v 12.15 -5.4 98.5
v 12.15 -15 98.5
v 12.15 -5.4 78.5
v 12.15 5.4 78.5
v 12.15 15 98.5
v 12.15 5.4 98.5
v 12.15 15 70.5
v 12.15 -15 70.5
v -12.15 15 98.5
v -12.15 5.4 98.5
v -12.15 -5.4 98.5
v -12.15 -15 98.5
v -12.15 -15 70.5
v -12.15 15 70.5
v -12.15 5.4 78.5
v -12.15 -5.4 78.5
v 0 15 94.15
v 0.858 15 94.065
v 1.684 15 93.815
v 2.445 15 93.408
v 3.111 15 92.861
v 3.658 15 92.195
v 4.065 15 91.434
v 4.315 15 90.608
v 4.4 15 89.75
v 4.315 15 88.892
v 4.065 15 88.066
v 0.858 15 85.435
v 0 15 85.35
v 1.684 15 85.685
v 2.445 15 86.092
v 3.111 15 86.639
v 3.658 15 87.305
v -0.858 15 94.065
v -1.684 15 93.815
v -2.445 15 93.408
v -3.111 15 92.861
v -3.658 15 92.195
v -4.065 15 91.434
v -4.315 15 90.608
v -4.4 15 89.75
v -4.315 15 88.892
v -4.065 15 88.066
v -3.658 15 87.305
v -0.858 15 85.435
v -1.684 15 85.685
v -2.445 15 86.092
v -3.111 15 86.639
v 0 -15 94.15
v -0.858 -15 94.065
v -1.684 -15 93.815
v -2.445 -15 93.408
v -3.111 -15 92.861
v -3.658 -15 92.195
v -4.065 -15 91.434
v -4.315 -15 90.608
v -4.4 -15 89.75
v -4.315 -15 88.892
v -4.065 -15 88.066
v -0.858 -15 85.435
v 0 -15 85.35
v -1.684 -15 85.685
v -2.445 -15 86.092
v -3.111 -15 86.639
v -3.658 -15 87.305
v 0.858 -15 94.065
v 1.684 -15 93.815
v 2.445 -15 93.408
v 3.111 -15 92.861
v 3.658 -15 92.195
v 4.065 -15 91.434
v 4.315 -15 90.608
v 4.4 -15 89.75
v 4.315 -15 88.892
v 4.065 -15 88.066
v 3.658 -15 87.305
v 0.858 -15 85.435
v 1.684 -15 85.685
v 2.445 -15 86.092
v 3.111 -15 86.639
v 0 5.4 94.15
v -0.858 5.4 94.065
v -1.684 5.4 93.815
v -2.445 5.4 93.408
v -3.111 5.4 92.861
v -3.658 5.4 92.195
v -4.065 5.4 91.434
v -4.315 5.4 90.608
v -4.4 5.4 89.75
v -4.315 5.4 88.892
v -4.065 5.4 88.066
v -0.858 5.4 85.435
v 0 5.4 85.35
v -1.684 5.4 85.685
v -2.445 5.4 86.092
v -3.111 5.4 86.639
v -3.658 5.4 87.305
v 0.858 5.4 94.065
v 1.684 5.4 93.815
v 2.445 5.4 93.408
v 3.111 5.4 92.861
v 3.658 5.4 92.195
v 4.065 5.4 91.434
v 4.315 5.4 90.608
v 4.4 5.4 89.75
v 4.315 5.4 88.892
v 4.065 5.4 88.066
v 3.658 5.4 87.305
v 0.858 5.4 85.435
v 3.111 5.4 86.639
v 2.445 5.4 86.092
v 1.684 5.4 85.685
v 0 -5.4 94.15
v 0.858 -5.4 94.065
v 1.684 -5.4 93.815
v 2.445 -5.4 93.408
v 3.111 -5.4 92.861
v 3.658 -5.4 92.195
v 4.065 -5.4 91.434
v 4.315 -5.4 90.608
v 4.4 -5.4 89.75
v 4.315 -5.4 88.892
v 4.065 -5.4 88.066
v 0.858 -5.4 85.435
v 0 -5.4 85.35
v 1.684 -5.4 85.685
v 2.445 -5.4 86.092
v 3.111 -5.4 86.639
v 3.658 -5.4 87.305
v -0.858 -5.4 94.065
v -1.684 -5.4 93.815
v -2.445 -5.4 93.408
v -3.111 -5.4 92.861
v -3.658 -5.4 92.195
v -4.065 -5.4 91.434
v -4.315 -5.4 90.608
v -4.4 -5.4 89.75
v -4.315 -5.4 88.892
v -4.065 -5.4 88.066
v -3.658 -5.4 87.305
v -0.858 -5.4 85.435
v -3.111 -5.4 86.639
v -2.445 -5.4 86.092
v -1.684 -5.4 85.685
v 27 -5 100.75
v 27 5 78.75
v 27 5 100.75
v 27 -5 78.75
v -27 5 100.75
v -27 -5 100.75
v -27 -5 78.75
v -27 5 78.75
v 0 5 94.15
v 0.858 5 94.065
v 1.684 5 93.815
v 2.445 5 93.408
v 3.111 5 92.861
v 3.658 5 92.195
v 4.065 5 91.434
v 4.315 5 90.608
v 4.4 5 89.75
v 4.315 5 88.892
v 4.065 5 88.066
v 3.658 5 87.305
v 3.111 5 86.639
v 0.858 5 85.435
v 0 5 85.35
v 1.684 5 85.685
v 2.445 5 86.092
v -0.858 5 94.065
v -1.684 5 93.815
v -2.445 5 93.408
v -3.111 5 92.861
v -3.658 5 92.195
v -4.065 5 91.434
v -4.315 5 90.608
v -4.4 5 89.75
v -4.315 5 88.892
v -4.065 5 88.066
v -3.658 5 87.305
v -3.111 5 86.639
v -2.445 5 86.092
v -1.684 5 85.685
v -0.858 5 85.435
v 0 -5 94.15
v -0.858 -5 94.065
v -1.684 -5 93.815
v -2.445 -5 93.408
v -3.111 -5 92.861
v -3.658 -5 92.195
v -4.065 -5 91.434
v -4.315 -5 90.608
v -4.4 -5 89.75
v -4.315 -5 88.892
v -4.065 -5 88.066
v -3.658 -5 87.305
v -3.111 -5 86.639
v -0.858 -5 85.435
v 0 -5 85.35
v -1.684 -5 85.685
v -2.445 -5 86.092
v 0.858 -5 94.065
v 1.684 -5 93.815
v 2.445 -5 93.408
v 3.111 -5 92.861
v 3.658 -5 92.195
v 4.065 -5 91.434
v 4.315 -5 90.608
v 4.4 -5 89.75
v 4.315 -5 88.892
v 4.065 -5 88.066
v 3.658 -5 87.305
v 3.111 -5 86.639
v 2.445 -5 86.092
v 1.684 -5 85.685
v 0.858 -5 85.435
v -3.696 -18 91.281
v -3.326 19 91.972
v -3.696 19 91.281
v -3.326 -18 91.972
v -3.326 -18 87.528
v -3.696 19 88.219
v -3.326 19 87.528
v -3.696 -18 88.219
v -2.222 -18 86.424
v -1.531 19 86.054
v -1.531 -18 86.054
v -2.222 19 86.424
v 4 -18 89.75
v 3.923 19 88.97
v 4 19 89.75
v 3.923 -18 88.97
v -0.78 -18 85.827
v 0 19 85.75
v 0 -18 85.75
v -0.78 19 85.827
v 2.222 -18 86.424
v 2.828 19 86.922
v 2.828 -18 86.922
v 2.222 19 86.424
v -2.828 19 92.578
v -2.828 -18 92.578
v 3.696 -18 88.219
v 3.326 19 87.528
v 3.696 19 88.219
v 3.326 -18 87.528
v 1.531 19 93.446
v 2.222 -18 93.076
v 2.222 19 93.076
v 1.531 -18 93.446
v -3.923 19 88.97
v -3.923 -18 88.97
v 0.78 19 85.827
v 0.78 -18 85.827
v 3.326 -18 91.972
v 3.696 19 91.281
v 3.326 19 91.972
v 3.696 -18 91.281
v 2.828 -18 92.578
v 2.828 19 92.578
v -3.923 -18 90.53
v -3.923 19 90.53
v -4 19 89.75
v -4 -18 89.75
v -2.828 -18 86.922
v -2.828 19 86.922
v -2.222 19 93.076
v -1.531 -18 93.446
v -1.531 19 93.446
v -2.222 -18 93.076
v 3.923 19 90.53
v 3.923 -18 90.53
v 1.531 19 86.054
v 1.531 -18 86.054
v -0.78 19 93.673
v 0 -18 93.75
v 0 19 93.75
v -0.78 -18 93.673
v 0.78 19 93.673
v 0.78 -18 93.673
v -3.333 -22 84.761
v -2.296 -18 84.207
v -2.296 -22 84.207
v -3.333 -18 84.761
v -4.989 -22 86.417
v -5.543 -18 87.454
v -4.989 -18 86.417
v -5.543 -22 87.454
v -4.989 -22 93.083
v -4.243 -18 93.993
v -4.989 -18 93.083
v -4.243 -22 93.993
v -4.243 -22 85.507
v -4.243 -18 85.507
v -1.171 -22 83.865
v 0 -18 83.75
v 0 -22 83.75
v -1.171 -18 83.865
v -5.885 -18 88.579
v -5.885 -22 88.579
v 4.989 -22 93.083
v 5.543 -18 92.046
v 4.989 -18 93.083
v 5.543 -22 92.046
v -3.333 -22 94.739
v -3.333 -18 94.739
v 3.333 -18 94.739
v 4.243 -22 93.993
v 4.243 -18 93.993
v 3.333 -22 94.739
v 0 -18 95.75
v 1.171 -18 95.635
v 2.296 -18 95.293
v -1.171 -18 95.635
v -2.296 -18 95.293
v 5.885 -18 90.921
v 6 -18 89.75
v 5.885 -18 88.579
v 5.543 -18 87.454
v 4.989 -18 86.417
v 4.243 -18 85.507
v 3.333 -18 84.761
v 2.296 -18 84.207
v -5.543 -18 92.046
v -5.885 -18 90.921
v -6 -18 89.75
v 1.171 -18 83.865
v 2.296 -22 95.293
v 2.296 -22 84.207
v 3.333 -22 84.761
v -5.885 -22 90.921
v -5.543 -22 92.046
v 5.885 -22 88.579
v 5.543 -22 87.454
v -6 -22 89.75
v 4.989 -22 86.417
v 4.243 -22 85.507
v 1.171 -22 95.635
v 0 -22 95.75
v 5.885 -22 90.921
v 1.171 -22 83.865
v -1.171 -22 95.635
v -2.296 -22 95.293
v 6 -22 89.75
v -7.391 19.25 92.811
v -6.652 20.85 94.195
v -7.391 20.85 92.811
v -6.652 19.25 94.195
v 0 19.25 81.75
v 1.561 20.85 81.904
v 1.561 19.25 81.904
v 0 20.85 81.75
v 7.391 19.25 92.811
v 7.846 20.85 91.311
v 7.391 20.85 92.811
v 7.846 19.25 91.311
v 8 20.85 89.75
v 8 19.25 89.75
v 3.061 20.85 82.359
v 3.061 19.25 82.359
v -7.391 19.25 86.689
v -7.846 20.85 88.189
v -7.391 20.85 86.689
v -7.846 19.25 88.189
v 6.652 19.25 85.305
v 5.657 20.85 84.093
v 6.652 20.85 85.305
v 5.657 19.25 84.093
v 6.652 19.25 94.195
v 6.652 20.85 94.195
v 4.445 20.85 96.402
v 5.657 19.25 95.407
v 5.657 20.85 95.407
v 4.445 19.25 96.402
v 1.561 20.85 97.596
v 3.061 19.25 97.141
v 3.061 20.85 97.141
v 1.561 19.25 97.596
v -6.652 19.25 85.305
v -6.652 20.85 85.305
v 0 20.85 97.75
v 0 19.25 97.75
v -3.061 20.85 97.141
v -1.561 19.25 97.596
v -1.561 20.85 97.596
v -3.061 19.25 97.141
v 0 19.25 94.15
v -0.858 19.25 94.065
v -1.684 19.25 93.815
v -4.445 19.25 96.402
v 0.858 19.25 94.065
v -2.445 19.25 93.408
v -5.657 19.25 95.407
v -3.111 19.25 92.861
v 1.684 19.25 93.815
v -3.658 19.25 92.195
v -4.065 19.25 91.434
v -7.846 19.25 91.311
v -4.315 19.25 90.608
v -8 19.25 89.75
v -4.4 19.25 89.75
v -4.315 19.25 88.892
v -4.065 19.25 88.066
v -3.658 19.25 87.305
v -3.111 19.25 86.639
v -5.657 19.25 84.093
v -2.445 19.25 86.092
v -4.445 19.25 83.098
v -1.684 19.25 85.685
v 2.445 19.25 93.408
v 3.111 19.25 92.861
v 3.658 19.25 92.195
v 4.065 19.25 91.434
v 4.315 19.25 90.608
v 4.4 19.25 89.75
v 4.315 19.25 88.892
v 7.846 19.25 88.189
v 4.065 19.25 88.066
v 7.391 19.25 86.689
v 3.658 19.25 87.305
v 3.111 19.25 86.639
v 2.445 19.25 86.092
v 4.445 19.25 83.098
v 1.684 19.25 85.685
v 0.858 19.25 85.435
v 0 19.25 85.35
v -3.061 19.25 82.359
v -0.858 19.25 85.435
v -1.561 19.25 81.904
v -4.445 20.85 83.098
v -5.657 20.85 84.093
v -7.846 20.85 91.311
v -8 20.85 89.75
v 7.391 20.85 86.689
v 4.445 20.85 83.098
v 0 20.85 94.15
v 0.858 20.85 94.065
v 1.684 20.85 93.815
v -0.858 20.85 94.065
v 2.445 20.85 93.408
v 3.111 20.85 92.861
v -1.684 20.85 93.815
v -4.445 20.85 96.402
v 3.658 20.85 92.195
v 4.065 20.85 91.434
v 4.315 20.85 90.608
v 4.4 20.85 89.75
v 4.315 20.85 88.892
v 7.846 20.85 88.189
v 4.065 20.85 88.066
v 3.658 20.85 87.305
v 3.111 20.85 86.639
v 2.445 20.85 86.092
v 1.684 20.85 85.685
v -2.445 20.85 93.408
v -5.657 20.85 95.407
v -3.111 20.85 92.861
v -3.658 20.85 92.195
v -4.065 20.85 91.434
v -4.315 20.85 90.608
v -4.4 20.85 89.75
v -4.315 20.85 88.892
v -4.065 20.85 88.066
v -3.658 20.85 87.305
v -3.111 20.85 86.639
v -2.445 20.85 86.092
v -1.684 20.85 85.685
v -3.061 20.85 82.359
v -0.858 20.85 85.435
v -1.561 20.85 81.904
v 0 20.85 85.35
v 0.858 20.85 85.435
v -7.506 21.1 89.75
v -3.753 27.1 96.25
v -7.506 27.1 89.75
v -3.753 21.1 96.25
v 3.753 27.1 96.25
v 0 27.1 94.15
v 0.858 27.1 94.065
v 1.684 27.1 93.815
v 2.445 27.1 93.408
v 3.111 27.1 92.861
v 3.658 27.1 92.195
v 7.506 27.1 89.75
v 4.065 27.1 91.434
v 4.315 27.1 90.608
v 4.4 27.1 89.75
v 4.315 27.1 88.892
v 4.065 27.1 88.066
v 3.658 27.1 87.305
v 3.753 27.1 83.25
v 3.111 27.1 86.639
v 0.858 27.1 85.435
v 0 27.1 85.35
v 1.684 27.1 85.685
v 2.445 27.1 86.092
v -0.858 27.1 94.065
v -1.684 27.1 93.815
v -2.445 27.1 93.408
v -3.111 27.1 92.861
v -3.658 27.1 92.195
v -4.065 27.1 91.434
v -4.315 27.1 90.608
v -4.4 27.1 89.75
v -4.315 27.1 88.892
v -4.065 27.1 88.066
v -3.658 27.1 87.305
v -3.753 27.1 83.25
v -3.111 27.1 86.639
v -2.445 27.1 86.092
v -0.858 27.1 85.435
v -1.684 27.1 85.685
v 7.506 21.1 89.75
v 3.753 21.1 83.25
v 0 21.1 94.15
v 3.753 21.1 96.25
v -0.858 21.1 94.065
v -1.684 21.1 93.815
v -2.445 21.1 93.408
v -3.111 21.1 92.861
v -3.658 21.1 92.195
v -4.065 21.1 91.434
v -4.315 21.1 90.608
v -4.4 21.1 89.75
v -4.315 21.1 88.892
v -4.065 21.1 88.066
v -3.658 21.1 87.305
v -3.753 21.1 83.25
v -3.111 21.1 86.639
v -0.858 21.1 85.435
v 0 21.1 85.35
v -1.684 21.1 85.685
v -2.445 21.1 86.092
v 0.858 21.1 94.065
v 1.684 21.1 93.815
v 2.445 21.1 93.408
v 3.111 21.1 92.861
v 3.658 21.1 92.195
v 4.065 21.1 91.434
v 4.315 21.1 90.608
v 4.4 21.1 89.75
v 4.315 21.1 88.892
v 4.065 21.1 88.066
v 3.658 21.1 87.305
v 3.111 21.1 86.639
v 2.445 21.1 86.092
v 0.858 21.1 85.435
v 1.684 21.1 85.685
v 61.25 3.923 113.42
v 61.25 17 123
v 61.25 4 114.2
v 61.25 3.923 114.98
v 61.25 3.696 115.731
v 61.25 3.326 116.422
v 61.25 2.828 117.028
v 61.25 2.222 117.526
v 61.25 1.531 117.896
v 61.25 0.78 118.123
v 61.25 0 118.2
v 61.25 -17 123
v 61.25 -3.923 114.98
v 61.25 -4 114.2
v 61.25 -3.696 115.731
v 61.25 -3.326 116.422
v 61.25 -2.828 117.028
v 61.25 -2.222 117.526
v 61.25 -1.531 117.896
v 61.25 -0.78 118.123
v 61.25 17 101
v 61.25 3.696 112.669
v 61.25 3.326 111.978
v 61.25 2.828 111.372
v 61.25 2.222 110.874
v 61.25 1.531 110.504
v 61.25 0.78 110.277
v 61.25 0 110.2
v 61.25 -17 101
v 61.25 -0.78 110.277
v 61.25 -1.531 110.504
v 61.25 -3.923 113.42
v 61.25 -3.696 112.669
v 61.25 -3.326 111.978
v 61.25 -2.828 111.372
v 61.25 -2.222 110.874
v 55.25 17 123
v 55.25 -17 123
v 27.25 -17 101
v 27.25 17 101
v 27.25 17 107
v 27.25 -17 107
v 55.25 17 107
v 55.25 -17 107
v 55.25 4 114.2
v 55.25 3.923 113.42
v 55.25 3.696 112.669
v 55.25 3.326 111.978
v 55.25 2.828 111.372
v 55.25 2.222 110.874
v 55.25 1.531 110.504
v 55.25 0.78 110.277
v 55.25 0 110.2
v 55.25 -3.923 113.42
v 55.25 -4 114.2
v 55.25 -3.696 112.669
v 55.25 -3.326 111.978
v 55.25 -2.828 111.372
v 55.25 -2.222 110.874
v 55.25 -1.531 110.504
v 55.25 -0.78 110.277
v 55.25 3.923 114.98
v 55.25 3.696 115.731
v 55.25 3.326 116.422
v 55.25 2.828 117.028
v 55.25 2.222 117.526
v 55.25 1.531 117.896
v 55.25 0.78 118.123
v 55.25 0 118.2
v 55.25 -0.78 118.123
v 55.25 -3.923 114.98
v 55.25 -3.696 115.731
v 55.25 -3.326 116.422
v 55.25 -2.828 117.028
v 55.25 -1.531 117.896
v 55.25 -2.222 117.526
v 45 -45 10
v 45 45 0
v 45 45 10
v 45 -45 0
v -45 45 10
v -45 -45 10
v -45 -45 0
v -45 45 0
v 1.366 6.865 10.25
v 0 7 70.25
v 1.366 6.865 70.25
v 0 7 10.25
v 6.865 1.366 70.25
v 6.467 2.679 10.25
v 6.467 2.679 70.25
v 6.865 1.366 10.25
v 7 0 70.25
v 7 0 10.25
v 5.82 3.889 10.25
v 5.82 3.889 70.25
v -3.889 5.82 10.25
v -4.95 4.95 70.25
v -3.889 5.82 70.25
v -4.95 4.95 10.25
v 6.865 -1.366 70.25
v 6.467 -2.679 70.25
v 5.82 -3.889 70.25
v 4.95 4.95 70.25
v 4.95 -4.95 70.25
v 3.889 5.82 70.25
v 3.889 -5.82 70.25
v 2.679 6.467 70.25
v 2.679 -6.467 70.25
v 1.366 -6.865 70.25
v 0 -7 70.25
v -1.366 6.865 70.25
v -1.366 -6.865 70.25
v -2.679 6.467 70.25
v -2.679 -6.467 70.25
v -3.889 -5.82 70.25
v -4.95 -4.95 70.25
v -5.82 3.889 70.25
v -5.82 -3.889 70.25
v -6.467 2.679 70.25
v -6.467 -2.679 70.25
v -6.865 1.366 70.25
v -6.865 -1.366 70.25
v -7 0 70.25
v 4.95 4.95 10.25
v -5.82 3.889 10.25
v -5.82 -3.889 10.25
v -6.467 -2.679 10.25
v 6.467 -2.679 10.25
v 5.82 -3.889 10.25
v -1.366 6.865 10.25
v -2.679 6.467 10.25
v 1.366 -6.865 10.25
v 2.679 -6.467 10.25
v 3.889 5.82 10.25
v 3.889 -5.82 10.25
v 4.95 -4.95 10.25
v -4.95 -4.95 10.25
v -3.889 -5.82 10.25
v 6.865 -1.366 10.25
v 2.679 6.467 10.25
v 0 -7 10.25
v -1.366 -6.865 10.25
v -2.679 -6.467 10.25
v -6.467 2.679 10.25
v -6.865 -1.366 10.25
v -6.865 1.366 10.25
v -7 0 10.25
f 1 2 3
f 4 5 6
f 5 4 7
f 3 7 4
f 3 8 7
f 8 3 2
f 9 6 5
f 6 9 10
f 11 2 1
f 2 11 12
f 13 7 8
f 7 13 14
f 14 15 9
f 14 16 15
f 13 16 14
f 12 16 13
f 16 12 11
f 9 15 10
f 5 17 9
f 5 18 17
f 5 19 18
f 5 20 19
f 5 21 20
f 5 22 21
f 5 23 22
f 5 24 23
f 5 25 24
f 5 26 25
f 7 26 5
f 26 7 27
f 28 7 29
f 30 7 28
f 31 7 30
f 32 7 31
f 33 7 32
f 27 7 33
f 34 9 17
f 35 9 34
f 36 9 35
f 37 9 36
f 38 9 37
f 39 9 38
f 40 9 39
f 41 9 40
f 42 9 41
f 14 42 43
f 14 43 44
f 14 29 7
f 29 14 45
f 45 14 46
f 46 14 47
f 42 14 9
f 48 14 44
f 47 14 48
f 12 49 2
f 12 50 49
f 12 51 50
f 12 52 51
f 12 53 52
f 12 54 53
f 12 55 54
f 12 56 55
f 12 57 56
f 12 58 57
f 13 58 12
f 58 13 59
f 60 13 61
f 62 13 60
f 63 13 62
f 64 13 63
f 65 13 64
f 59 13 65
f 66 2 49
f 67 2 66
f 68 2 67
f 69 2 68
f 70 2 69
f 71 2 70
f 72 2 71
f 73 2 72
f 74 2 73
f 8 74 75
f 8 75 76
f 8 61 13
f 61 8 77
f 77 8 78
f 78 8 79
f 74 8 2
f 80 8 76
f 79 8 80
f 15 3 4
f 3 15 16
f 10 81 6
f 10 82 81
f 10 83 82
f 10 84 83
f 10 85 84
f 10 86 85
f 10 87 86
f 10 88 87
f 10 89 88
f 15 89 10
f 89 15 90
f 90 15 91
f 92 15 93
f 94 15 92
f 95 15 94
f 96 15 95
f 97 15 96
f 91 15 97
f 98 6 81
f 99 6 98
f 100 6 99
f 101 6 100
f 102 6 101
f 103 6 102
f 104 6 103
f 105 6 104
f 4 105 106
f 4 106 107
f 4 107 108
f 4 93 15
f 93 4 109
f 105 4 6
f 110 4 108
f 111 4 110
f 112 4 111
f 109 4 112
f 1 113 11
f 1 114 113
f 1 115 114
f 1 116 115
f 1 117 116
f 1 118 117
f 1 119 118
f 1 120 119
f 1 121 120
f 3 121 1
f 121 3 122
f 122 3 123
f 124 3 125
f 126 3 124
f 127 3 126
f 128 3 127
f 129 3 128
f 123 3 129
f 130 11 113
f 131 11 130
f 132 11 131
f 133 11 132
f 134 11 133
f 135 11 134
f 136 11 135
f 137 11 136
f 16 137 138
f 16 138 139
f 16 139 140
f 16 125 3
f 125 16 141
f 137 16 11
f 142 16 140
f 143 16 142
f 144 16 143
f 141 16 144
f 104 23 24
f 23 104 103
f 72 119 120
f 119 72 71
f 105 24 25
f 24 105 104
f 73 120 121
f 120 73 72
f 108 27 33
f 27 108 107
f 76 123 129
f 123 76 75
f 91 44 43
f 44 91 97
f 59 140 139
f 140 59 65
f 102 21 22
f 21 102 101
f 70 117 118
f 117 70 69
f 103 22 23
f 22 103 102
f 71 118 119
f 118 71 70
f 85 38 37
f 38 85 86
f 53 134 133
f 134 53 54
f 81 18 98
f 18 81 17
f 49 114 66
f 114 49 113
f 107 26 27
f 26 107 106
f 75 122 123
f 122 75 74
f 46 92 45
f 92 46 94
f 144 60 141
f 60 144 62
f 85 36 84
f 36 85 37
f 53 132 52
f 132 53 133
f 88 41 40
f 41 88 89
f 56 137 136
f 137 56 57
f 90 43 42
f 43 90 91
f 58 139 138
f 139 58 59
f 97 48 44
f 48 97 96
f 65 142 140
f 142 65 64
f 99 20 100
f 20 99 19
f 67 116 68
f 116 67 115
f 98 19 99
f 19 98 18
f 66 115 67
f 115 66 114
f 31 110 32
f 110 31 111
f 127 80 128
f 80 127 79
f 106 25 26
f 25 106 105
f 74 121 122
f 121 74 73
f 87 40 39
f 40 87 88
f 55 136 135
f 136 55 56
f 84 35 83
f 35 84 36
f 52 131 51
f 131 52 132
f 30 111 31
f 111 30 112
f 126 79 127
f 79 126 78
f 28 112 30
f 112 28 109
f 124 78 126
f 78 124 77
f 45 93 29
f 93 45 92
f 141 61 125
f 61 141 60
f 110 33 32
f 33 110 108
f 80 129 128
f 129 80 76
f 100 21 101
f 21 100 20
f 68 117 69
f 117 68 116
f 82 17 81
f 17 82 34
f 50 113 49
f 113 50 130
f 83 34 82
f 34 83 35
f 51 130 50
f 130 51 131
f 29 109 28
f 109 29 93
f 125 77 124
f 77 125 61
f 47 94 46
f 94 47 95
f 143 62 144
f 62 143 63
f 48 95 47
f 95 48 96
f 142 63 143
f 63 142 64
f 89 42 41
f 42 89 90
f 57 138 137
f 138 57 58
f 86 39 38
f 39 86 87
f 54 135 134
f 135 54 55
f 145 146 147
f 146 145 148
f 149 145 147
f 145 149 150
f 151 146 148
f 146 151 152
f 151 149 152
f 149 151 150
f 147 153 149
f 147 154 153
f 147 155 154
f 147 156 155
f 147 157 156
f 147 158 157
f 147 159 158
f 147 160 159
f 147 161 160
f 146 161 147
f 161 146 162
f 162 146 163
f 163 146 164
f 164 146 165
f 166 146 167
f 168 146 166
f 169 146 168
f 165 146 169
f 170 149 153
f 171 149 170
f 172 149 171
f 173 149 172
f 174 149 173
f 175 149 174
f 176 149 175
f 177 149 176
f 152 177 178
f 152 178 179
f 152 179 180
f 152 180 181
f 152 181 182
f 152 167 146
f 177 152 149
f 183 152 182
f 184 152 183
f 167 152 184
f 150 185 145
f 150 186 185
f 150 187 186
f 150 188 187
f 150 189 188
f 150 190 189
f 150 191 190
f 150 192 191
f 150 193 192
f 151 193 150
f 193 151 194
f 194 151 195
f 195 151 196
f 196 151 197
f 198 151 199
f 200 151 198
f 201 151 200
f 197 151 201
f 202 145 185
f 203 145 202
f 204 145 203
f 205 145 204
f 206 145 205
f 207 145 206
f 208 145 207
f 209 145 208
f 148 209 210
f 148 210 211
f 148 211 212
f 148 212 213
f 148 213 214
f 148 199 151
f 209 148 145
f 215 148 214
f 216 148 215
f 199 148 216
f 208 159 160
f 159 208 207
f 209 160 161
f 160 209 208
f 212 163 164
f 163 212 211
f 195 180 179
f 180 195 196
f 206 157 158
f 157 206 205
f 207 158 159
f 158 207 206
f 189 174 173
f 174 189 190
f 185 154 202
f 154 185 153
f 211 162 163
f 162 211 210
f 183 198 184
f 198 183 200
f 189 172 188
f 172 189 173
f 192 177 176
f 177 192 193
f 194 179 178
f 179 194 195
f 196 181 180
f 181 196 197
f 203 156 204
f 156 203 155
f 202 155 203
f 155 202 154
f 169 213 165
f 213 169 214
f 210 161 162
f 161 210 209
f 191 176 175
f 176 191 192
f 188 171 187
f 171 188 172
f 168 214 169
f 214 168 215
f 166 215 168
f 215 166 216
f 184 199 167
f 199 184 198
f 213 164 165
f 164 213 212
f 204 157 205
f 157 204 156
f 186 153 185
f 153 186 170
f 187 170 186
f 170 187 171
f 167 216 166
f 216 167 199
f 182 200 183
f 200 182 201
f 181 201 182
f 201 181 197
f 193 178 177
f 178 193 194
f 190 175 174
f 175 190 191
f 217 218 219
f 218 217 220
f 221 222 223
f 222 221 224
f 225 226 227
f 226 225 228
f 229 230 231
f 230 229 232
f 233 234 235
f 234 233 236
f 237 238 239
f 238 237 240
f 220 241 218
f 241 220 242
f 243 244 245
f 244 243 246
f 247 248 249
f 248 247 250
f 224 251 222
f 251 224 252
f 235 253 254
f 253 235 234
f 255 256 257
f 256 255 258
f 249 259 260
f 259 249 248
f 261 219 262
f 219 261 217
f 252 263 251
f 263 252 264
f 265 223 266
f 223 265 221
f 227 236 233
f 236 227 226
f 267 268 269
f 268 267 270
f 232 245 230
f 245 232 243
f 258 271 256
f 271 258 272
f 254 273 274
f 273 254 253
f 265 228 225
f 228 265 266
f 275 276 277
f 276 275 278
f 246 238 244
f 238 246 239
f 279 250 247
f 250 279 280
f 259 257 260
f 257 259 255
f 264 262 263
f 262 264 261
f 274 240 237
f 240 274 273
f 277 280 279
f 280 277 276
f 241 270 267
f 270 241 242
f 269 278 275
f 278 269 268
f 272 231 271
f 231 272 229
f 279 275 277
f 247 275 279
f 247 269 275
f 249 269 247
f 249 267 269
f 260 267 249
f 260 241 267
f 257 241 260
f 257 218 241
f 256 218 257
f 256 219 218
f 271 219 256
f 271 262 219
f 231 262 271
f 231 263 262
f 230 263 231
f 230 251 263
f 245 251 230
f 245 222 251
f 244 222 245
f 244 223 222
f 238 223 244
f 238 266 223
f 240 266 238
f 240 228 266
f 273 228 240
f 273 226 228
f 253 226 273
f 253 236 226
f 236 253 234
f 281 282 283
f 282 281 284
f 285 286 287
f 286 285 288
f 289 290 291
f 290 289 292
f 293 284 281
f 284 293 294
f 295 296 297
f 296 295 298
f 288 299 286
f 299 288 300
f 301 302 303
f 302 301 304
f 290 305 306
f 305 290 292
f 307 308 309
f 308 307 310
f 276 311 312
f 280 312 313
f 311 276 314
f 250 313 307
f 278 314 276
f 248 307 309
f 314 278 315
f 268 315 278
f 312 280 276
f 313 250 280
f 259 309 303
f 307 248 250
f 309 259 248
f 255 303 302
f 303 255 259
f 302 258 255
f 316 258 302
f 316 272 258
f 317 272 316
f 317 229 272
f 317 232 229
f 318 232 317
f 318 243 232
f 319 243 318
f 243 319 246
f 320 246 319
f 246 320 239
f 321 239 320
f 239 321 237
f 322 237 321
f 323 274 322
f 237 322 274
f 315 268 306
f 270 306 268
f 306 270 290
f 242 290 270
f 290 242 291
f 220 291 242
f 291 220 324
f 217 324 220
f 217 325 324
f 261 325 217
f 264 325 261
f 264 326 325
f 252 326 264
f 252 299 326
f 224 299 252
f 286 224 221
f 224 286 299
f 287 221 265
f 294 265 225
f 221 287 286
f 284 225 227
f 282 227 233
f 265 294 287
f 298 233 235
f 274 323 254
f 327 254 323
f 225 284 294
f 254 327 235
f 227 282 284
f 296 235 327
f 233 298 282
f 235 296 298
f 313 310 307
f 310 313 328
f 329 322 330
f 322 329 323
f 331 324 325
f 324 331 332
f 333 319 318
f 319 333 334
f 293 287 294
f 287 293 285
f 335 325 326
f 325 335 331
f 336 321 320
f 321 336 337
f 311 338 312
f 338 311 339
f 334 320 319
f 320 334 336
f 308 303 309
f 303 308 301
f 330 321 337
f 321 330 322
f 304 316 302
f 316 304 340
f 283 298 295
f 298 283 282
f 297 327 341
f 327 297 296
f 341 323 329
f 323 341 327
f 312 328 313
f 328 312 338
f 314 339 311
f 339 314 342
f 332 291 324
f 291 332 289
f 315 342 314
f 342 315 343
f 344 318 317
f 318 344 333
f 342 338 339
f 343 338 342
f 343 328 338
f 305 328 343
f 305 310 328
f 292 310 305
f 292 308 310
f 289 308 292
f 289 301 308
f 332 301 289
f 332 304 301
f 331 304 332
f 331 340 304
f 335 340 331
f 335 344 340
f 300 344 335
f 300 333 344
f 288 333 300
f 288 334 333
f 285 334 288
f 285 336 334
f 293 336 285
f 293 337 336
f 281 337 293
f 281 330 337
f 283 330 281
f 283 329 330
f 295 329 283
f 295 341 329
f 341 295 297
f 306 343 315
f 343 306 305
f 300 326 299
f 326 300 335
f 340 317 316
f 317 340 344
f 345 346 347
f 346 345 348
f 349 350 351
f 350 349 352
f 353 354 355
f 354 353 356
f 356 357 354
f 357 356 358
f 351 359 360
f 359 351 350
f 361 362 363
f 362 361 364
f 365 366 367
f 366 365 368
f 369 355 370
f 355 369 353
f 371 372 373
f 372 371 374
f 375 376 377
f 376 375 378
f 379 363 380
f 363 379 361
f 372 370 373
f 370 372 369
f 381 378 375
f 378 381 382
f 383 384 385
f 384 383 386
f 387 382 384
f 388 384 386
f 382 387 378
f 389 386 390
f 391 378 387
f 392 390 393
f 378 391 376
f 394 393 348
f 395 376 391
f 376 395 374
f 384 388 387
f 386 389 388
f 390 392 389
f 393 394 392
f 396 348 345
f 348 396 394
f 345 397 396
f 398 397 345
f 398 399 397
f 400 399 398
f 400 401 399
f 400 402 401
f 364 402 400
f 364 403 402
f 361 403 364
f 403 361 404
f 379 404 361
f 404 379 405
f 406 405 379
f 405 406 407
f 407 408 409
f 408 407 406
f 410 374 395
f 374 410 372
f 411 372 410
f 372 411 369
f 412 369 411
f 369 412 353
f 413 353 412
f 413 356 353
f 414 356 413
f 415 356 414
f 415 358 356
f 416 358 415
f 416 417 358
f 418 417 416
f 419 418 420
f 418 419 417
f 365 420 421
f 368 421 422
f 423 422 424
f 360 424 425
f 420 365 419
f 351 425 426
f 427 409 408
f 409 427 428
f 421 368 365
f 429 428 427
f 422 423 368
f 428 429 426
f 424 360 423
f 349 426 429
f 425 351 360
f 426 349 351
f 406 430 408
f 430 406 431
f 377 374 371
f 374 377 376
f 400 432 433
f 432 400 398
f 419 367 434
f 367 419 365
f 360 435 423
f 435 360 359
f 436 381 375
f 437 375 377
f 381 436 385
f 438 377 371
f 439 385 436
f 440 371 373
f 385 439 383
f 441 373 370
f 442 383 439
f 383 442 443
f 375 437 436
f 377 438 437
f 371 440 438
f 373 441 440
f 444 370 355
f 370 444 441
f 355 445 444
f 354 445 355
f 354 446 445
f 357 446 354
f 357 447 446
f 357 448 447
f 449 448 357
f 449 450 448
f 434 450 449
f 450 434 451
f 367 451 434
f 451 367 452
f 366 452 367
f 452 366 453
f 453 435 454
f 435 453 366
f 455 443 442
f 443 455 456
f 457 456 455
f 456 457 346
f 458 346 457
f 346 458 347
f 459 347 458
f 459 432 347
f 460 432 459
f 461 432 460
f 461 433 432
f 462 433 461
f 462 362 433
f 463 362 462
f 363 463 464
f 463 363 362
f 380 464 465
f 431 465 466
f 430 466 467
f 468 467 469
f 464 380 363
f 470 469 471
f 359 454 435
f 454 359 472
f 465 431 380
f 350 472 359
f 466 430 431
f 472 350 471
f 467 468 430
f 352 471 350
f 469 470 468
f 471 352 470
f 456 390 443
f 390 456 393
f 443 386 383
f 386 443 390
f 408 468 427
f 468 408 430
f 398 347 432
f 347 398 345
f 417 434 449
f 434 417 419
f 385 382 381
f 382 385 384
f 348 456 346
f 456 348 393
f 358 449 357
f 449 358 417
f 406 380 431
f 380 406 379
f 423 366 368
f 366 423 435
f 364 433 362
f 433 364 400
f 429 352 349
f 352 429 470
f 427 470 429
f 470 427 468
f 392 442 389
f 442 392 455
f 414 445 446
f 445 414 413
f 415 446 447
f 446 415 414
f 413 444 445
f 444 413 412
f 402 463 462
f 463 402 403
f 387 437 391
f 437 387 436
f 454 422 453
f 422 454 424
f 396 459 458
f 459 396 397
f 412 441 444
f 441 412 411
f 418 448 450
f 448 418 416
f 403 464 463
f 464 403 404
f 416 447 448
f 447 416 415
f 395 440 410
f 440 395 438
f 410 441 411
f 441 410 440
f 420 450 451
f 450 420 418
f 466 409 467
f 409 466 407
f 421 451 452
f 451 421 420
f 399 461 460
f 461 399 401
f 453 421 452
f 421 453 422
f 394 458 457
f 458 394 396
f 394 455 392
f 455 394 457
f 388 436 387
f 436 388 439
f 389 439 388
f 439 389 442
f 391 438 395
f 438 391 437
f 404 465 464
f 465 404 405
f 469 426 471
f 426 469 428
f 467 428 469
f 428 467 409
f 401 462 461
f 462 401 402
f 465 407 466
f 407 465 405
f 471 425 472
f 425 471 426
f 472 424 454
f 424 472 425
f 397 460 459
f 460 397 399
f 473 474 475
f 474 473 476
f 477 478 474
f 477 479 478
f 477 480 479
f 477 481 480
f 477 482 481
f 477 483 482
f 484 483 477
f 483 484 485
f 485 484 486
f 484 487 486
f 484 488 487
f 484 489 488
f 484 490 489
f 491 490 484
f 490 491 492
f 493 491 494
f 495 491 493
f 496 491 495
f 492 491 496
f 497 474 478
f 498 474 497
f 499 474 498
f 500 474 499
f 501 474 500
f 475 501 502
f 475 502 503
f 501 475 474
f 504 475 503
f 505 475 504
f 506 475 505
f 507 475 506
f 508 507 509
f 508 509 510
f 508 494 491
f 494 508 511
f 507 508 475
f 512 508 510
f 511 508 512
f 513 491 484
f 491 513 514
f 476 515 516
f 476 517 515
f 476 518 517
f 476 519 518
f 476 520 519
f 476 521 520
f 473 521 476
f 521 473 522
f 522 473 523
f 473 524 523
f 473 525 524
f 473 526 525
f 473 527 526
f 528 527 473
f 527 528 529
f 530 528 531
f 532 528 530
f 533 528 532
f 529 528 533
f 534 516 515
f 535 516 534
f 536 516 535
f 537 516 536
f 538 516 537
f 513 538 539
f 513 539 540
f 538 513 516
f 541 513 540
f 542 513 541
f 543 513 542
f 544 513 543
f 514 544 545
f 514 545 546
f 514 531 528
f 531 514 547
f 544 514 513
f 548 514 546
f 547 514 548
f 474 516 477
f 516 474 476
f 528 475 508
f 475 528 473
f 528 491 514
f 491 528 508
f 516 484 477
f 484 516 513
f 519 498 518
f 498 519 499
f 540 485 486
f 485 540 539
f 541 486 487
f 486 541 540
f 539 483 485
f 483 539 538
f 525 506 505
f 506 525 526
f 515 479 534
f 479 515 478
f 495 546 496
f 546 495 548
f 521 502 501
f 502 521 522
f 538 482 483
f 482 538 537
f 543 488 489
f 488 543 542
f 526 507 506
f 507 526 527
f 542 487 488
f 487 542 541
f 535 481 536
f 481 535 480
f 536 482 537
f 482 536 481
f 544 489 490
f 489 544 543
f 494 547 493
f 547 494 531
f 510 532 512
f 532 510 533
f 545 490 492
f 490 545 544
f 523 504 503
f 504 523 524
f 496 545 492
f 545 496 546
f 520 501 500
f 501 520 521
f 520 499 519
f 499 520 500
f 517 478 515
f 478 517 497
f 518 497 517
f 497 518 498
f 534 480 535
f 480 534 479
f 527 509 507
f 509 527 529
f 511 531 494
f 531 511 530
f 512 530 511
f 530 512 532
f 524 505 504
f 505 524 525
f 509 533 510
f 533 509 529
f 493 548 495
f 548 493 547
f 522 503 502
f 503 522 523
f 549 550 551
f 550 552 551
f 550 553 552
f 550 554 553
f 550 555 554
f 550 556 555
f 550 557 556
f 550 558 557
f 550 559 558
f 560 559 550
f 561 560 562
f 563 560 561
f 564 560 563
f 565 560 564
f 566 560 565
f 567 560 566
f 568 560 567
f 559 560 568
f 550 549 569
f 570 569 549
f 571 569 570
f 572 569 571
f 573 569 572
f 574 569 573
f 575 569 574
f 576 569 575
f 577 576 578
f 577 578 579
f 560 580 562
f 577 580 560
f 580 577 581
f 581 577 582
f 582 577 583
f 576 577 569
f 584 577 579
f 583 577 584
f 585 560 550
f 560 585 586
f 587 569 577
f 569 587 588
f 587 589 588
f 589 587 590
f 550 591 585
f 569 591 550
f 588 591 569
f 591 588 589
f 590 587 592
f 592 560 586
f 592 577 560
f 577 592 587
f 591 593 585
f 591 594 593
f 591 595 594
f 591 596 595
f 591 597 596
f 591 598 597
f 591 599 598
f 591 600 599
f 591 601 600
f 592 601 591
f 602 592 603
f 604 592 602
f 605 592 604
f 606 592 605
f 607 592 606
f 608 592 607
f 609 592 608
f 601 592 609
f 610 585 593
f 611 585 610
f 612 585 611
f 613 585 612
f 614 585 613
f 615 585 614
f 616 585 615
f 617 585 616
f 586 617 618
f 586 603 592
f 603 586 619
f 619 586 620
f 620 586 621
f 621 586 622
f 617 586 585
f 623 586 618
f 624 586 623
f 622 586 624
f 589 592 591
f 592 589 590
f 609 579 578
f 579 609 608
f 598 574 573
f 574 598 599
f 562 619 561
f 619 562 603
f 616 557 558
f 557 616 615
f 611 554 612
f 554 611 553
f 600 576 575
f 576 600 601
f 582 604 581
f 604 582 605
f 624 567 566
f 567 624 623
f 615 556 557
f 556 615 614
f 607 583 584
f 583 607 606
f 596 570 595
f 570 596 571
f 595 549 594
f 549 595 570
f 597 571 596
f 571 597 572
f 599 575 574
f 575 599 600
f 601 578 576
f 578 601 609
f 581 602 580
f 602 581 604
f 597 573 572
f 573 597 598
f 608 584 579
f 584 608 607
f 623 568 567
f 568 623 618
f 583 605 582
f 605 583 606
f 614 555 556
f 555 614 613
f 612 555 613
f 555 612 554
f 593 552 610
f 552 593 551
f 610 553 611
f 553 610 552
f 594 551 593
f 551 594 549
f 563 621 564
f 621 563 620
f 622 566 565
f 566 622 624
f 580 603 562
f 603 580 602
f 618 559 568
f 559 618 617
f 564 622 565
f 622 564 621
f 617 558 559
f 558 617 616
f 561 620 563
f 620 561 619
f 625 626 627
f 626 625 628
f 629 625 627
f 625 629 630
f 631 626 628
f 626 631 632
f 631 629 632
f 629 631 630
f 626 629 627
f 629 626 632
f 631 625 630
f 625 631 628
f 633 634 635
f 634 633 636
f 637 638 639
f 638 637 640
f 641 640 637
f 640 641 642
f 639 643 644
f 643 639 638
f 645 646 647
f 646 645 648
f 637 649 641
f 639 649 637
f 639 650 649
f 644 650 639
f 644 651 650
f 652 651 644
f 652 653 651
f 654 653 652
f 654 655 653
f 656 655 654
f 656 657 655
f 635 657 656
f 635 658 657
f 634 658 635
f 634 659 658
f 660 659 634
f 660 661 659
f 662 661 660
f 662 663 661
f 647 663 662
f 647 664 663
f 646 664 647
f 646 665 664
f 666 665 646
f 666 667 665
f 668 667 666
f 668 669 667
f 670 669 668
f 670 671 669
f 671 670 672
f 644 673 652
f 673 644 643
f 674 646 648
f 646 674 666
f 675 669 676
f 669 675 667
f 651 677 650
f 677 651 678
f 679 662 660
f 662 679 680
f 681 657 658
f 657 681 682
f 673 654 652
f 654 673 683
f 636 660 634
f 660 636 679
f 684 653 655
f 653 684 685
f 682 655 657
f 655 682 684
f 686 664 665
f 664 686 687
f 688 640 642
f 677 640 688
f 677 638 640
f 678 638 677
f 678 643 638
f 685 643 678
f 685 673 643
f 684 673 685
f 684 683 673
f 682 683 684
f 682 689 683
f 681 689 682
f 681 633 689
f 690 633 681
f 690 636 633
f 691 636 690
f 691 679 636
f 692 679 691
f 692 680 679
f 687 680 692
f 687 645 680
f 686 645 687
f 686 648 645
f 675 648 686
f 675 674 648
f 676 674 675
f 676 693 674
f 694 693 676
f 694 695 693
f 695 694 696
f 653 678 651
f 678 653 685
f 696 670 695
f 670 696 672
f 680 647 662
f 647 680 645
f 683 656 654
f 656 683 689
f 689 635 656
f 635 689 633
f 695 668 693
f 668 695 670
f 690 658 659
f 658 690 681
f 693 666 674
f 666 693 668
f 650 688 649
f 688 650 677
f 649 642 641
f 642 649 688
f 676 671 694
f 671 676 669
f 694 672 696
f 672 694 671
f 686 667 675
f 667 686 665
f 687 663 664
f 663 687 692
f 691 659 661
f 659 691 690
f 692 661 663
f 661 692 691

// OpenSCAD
$fn = 32;

// ------------------------------------------------------------------------
// Lamp arm: column d14 x 60 mm, arm 54 mm
// Every part is its own module, assembly() places every instance.
// ------------------------------------------------------------------------

// --- part 1 ---
module lamp_base() {
  difference() {
    translate([-45, -45, 0]) cube([90, 90, 10]);
  }
}

// --- part 2 ---
module lamp_column() {
  cylinder(h = 60, d = 14);
}

// --- part 3 ---
module head_fork() {
  difference() {
    translate([-12.15, -15, 0]) cube([24.3, 30, 28]);
    translate([-13.15, -5.4, 8]) cube([26.3, 10.8, 21]);
    translate([0, 0, 19.25]) rotate([90, 0, 0]) cylinder(h = 32, d = 8.8, center = true);
  }
}

// --- part 4 ---
module lamp_arm() {
  difference() {
    translate([-27, -5, 0]) cube([54, 10, 22]);
    translate([0, 0, 11]) rotate([90, 0, 0]) cylinder(h = 12, d = 8.8, center = true);
  }
}

// --- part 5 ---
module arm_pin() {
  rotate([0, 90, 0]) cylinder(h = 38, d = 8, center = true);
  translate([-22, 0, 0]) rotate([0, 90, 0]) cylinder(h = 4, d = 12);
}

// --- part 6 ---
module arm_washer() {
  difference() {
      translate([0, 0, 0]) cylinder(h = 1.6, d = 16);
      translate([0, 0, -1]) cylinder(h = 3.6, d = 8.8);
    }
}

// --- part 7 ---
module arm_nut() {
  difference() {
    linear_extrude(height = 6) polygon(points = [[7.506, 0], [3.753, 6.5], [-3.753, 6.5], [-7.506, 0], [-3.753, -6.5], [3.753, -6.5]]);
    translate([0, 0, -1]) cylinder(h = 8, d = 8.8);
  }
}

// --- part 8 ---
module shade_bracket() {
  difference() {
    translate([-17, -17, 0]) cube([34, 34, 22]);
    translate([-18, -18, 6]) cube([29, 36, 17]);
    translate([14, 0, 13.2]) rotate([0, 90, 0]) cylinder(h = 8, d = 8, center = true);
  }
}

// --- assembly ---
module assembly() {
  color([0.80, 0.24, 0.20]) translate([0, 0, 0]) rotate([0, 0, 0]) lamp_base();
  color([0.20, 0.45, 0.75]) translate([0, 0, 10.25]) rotate([0, 0, 0]) lamp_column();
  color([0.25, 0.62, 0.32]) translate([0, 0, 70.5]) rotate([0, 0, 0]) head_fork();
  color([0.92, 0.70, 0.18]) translate([0, 0, 78.75]) rotate([0, 0, 0]) lamp_arm();
  color([0.58, 0.35, 0.70]) translate([0, 0, 89.75]) rotate([0, 0, 90]) arm_pin();
  color([0.16, 0.66, 0.66]) translate([0, 20.85, 89.75]) rotate([90, 0, 0]) arm_washer();
  color([0.85, 0.48, 0.18]) translate([0, 27.1, 89.75]) rotate([90, 0, 0]) arm_nut();
  color([0.55, 0.60, 0.65]) translate([44.25, 0, 101]) rotate([0, 0, 0]) shade_bracket();
}

assembly();
